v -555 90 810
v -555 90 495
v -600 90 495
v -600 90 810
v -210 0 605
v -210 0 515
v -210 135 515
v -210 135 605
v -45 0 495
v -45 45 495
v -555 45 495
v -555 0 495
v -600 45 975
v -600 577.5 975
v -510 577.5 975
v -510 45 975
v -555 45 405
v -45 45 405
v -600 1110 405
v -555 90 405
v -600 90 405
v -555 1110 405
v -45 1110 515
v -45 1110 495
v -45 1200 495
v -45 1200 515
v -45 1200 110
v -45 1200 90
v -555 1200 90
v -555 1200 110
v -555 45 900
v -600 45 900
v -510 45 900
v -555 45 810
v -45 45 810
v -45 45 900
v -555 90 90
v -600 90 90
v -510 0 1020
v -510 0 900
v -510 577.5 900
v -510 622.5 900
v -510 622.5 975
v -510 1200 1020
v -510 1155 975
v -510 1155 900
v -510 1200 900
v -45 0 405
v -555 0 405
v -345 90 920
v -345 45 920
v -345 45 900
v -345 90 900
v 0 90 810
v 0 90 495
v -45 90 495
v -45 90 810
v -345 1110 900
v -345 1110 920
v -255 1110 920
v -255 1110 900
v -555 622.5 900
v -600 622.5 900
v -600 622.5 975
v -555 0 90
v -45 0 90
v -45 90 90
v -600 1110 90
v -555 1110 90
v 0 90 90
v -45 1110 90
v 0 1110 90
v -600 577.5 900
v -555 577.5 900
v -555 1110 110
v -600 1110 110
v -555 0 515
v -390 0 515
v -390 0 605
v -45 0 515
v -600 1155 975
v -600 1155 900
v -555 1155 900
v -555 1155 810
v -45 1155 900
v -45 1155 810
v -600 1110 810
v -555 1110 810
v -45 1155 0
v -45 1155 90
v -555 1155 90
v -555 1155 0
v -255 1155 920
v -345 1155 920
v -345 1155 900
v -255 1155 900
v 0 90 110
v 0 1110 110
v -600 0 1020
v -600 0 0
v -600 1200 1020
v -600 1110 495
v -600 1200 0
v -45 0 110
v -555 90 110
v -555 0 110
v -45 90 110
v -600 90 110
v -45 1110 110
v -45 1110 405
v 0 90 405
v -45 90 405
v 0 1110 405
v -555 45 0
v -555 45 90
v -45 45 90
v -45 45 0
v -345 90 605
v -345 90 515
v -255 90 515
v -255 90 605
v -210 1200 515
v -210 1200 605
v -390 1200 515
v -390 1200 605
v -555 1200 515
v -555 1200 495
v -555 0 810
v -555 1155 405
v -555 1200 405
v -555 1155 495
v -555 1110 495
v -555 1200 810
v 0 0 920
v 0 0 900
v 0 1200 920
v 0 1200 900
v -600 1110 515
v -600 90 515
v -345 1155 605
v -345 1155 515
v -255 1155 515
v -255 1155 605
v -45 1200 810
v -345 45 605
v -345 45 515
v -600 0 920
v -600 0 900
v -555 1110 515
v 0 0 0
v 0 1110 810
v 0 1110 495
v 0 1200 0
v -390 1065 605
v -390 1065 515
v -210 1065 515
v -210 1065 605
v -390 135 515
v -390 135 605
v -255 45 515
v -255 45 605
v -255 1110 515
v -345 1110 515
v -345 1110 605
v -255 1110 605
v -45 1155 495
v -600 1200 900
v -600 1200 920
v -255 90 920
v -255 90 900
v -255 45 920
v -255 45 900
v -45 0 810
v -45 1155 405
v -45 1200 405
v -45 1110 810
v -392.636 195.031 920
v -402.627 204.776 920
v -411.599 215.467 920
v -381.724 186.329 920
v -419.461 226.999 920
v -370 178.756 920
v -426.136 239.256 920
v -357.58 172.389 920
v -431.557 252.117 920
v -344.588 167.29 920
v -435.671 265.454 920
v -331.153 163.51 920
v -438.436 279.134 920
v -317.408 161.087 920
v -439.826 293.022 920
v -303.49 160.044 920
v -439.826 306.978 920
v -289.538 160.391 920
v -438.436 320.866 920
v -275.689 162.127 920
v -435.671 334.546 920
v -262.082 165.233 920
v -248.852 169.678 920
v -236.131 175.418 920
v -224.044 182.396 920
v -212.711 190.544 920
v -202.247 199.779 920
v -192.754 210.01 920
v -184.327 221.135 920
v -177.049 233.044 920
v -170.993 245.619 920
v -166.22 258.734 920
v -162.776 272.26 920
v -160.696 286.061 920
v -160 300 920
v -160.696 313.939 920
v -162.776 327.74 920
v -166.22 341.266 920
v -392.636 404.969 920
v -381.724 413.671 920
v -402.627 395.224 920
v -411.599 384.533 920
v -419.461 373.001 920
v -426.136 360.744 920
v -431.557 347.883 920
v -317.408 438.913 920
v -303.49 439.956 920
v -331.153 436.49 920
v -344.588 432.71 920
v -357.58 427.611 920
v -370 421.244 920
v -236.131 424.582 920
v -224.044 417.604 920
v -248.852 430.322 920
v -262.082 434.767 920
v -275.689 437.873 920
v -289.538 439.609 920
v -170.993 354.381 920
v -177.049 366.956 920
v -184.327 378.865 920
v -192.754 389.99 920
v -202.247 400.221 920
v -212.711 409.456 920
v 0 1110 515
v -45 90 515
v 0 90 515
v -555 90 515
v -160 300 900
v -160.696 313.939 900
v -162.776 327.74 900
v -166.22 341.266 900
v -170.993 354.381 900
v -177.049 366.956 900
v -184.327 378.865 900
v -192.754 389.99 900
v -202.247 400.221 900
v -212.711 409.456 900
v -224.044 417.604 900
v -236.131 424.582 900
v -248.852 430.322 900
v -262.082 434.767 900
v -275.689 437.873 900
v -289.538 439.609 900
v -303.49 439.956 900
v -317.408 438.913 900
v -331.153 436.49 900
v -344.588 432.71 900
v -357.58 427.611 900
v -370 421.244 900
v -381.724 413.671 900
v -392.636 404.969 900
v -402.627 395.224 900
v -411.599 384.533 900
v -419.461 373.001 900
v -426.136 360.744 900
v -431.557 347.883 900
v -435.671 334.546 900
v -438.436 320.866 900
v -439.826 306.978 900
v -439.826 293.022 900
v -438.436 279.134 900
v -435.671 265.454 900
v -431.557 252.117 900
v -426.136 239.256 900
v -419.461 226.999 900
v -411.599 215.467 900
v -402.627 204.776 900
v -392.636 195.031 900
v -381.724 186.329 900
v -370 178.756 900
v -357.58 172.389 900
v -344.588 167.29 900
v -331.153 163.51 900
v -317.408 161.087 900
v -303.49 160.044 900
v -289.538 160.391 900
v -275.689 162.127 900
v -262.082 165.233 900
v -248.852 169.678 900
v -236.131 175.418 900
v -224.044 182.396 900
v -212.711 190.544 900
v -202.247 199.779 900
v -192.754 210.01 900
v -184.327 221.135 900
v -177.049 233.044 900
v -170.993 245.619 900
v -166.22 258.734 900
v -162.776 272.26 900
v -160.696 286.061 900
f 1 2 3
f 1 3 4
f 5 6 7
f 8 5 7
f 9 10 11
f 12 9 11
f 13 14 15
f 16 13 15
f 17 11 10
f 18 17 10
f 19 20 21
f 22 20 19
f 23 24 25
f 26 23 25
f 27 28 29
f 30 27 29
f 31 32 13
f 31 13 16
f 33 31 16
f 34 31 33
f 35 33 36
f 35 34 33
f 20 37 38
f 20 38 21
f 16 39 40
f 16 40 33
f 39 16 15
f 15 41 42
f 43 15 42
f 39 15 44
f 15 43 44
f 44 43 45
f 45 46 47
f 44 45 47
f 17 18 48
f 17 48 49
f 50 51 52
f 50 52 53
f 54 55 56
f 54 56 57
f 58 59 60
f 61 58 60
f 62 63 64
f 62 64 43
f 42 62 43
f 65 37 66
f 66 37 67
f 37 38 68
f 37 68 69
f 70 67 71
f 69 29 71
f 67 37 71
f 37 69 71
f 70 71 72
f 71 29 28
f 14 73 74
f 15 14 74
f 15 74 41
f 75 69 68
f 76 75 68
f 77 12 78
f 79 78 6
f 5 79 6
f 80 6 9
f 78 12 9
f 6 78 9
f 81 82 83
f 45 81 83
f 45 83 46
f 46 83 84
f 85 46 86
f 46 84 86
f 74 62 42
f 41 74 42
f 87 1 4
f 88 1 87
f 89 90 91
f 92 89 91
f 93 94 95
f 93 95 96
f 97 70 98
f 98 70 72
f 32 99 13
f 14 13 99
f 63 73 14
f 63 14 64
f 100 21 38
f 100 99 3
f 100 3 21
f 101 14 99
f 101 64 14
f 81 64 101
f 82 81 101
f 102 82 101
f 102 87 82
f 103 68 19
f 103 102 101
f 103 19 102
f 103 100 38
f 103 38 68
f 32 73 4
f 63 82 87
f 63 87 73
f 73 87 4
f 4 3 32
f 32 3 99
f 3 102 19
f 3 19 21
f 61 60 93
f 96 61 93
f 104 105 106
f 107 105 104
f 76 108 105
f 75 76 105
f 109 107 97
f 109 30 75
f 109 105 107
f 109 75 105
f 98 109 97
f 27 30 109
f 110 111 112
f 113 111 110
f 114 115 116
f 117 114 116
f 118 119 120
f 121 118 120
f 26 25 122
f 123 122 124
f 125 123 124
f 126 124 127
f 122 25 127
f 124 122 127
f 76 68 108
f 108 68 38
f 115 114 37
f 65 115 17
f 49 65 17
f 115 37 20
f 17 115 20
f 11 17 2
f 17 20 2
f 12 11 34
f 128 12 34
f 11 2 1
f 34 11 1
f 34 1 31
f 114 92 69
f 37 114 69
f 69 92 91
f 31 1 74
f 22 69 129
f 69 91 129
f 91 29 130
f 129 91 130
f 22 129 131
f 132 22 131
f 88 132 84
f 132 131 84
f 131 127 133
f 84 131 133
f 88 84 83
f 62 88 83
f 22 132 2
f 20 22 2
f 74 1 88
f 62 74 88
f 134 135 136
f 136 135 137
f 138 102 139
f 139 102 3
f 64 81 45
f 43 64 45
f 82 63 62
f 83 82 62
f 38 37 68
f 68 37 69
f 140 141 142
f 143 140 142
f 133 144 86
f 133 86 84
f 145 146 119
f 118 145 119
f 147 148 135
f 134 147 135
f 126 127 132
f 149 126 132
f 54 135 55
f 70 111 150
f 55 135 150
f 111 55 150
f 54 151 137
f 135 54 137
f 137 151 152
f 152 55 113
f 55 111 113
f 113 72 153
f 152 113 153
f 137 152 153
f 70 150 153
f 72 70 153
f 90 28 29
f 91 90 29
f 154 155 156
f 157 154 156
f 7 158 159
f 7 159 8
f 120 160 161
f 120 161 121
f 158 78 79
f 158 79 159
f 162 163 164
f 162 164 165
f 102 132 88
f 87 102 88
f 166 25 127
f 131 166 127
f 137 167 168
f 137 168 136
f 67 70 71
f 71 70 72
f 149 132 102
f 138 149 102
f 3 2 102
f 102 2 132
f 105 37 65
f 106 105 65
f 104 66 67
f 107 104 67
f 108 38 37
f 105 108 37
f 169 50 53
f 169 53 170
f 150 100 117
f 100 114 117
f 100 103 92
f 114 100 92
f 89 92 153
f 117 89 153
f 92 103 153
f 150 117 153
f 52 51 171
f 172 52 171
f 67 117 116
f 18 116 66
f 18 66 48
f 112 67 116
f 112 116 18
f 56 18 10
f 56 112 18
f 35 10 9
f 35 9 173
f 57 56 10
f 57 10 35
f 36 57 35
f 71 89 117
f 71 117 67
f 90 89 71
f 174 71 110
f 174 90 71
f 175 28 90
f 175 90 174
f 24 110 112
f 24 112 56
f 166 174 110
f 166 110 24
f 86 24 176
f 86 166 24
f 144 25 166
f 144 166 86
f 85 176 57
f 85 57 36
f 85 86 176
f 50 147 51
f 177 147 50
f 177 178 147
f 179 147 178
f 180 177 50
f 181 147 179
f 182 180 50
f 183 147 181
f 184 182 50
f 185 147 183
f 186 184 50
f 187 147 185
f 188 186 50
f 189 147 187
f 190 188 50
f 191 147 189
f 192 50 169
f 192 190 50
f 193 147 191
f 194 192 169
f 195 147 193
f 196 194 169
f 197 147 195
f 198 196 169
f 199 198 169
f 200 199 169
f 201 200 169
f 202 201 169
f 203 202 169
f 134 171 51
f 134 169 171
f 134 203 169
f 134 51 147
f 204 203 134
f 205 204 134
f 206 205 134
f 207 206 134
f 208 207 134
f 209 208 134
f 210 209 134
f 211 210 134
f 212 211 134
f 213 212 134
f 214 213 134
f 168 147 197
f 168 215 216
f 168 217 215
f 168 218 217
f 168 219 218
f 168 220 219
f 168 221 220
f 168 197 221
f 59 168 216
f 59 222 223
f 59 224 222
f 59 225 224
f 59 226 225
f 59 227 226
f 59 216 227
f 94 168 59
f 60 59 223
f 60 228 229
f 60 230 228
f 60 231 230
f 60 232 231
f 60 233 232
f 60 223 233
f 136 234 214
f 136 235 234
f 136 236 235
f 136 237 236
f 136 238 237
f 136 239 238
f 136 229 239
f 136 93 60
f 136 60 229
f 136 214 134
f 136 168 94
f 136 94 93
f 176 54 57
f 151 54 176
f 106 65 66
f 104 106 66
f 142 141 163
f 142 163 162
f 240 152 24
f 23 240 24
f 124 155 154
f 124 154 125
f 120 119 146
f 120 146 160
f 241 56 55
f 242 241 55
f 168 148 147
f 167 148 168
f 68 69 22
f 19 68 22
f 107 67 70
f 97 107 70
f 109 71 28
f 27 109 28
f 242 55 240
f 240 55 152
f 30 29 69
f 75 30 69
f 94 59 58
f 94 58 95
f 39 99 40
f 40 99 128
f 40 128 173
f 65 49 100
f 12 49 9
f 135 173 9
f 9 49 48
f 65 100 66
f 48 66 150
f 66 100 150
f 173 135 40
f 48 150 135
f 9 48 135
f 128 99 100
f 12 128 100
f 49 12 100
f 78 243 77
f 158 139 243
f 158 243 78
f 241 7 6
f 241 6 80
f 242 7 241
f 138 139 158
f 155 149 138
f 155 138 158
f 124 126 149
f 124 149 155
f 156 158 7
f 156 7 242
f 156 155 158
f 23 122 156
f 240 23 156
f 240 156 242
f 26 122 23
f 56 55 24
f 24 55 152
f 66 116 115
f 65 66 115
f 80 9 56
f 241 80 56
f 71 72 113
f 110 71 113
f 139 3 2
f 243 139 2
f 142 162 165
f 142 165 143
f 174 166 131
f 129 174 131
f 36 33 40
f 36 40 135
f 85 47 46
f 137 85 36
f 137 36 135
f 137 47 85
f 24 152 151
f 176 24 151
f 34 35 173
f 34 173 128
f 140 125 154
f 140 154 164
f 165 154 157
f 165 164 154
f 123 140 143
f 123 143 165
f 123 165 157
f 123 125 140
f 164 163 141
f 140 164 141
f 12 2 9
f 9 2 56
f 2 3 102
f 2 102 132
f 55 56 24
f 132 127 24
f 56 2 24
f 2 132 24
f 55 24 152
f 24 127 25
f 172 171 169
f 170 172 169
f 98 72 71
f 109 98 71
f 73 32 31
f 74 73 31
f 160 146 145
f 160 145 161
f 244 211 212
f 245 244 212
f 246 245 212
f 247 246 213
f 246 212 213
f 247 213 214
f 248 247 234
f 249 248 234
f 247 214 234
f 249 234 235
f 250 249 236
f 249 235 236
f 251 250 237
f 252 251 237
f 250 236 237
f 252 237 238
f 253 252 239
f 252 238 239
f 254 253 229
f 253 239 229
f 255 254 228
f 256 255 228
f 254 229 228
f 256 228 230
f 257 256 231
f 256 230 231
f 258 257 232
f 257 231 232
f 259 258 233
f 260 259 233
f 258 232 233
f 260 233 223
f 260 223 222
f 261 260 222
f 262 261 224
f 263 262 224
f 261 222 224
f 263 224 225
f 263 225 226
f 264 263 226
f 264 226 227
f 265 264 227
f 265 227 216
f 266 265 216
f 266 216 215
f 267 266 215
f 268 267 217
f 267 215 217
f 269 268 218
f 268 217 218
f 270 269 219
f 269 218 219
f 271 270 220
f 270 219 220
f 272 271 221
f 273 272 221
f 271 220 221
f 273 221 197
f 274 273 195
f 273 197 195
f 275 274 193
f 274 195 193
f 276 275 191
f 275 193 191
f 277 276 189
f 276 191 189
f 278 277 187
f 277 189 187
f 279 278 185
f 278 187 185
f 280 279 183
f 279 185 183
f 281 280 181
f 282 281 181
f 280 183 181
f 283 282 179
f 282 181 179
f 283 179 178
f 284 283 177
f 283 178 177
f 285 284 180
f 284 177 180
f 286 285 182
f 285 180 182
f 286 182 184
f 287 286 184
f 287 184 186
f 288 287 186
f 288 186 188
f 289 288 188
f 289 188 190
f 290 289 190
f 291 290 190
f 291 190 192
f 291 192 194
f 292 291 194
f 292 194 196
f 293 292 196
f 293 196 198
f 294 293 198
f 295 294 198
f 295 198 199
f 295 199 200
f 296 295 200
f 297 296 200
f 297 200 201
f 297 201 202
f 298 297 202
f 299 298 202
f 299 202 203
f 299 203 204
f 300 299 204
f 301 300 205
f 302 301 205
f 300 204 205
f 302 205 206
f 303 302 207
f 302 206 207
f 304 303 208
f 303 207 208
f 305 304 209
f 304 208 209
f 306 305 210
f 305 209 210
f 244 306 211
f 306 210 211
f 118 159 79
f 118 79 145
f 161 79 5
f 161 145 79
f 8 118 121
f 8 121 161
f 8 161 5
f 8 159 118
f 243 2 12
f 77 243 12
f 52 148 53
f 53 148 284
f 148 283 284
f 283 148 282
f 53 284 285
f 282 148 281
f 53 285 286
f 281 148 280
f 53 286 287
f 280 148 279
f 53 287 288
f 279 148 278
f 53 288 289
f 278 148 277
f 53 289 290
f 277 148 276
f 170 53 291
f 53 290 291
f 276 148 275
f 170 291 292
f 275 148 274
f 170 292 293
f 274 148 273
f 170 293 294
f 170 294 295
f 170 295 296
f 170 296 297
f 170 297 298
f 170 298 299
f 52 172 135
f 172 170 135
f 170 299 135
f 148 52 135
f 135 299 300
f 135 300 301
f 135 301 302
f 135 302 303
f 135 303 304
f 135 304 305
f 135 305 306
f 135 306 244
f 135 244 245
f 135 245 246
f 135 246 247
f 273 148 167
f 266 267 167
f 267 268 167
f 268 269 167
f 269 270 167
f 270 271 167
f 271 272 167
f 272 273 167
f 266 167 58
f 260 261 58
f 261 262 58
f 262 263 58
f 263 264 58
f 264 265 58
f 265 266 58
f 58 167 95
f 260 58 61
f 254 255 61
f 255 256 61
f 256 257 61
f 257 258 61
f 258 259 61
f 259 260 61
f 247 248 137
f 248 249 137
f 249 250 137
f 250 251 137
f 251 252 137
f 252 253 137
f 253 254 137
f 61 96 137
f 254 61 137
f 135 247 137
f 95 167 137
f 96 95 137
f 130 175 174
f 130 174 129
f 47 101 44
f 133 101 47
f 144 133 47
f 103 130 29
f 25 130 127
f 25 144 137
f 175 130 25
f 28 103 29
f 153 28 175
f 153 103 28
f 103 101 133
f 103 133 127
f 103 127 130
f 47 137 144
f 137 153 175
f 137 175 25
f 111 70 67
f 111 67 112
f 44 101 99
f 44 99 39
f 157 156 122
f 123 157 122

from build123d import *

# Parameters (mm, degrees)
F0_W      = 600
F0_H      = 1200
F1_DEPTH  = 900
F3_DEPTH  = 900.001
F4_W      = 1020
F4_H      = 315
F5_DEPTH  = 600.001
F6_W      = 510
F6_H      = 315
F7_DEPTH  = 1200.001
F8_W      = 600
F8_H      = 1200
F9_DEPTH  = 20
F11_DEPTH = 20
F13_DEPTH = 20
F14_R     = 140
F15_DEPTH = 20
F16_W     = 90
F16_H     = 45
F17_DEPTH = 20
F18_W     = 180
F18_H     = 135
F18_W_2   = 90
F18_H_2   = 45
F19_DEPTH = 90
F20_W     = 90
F20_H     = 45
F21_DEPTH = 75
F22_W     = 90
F22_H     = 1200
F23_DEPTH = 45


with BuildPart() as f1:
    # F0 (on Top) → F1 (new body)
    with BuildSketch(Plane.XY):
        with Locations((-300, 600)):
            Rectangle(F0_W, F0_H)
    extrude(amount=F1_DEPTH)

    # F2 (on face) → F3 (cut, through all)
    with BuildSketch(Plane.XY.offset(900)):
        Polygon((-555, 45), (-300, 45), (-45, 45), (-45, 600), (-45, 1155), (-300, 1155), (-555, 1155), (-555, 600), align=None)
    extrude(amount=-F3_DEPTH, mode=Mode.SUBTRACT)

    # F4 (on face) → F5 (cut, through all)
    with BuildSketch(Plane.YZ):
        with Locations((600, 652.5)):
            Rectangle(F4_W, F4_H)
        with Locations((600, 247.5)):
            Rectangle(F4_W, F4_H)
    extrude(amount=-F5_DEPTH, mode=Mode.SUBTRACT)

    # F6 (on face) → F7 (cut, through all)
    with BuildSketch(Plane(origin=(0, 1200, 0), x_dir=(-1, 0, 0), z_dir=(0, 1, 0))):
        with Locations((300, 652.5)):
            Rectangle(F6_W, F6_H)
        with Locations((300, 247.5)):
            Rectangle(F6_W, F6_H)
    extrude(amount=-F7_DEPTH, mode=Mode.SUBTRACT)

    # F20 (on face) → F21 (join)
    with BuildSketch(Plane.XY.offset(900)):
        with Locations((-555, 22.5)):
            Rectangle(F20_W, F20_H)
        with Locations((-555, 1177.5)):
            Rectangle(F20_W, F20_H)
        with Locations((-555, 600)):
            Rectangle(F20_W, F20_H)
    extrude(amount=F21_DEPTH)

    # F22 (on face) → F23 (join)
    with BuildSketch(Plane.XY.offset(975)):
        with Locations((-555, 600)):
            Rectangle(F22_W, F22_H)
    extrude(amount=F23_DEPTH)


with BuildPart() as f9:
    # F8 (on face) → F9 (new body)
    with BuildSketch(Plane.XY.offset(900)):
        with Locations((-300, 600)):
            Rectangle(F8_W, F8_H)
    extrude(amount=F9_DEPTH)

    # F14 (on face) → F15 (cut, through all)
    with BuildSketch(Plane.XY.offset(920)):
        with Locations((-300, 300)):
            Circle(F14_R)
    extrude(amount=-F15_DEPTH, mode=Mode.SUBTRACT)

    # F16 (on face) → F17 (cut, through all)
    with BuildSketch(Plane.XY.offset(920)):
        with Locations((-300, 67.5)):
            Rectangle(F16_W, F16_H)
        with Locations((-300, 1132.5)):
            Rectangle(F16_W, F16_H)
    extrude(amount=-F17_DEPTH, mode=Mode.SUBTRACT)


with BuildPart() as f11:
    # F10 (on face) → F11 (new body)
    with BuildSketch(Plane.XY.offset(495)):
        Polygon((-45, 90), (0, 90), (0, 1110), (-45, 1110), (-45, 1200), (-555, 1200), (-555, 1110), (-600, 1110), (-600, 90), (-555, 90), (-555, 0), (-45, 0), align=None)
    extrude(amount=F11_DEPTH)

    # F18 (on face) → F19 (join)
    with BuildSketch(Plane.XY.offset(515)):
        with Locations((-300, 67.5)):
            Rectangle(F18_W, F18_H)
        with Locations((-300, 67.5)):
            Rectangle(F18_W_2, F18_H_2, mode=Mode.SUBTRACT)
        with Locations((-300, 1132.5)):
            Rectangle(F18_W, F18_H)
        with Locations((-300, 1132.5)):
            Rectangle(F18_W_2, F18_H_2, mode=Mode.SUBTRACT)
    extrude(amount=F19_DEPTH)


with BuildPart() as f13:
    # F12 (on face) → F13 (new body)
    with BuildSketch(Plane.XY.offset(90)):
        Polygon((-45, 90), (0, 90), (0, 1110), (-45, 1110), (-45, 1200), (-555, 1200), (-555, 1110), (-600, 1110), (-600, 90), (-555, 90), (-555, 0), (-45, 0), align=None)
    extrude(amount=F13_DEPTH)


solid = Compound([f1.part, f9.part, f11.part, f13.part])
